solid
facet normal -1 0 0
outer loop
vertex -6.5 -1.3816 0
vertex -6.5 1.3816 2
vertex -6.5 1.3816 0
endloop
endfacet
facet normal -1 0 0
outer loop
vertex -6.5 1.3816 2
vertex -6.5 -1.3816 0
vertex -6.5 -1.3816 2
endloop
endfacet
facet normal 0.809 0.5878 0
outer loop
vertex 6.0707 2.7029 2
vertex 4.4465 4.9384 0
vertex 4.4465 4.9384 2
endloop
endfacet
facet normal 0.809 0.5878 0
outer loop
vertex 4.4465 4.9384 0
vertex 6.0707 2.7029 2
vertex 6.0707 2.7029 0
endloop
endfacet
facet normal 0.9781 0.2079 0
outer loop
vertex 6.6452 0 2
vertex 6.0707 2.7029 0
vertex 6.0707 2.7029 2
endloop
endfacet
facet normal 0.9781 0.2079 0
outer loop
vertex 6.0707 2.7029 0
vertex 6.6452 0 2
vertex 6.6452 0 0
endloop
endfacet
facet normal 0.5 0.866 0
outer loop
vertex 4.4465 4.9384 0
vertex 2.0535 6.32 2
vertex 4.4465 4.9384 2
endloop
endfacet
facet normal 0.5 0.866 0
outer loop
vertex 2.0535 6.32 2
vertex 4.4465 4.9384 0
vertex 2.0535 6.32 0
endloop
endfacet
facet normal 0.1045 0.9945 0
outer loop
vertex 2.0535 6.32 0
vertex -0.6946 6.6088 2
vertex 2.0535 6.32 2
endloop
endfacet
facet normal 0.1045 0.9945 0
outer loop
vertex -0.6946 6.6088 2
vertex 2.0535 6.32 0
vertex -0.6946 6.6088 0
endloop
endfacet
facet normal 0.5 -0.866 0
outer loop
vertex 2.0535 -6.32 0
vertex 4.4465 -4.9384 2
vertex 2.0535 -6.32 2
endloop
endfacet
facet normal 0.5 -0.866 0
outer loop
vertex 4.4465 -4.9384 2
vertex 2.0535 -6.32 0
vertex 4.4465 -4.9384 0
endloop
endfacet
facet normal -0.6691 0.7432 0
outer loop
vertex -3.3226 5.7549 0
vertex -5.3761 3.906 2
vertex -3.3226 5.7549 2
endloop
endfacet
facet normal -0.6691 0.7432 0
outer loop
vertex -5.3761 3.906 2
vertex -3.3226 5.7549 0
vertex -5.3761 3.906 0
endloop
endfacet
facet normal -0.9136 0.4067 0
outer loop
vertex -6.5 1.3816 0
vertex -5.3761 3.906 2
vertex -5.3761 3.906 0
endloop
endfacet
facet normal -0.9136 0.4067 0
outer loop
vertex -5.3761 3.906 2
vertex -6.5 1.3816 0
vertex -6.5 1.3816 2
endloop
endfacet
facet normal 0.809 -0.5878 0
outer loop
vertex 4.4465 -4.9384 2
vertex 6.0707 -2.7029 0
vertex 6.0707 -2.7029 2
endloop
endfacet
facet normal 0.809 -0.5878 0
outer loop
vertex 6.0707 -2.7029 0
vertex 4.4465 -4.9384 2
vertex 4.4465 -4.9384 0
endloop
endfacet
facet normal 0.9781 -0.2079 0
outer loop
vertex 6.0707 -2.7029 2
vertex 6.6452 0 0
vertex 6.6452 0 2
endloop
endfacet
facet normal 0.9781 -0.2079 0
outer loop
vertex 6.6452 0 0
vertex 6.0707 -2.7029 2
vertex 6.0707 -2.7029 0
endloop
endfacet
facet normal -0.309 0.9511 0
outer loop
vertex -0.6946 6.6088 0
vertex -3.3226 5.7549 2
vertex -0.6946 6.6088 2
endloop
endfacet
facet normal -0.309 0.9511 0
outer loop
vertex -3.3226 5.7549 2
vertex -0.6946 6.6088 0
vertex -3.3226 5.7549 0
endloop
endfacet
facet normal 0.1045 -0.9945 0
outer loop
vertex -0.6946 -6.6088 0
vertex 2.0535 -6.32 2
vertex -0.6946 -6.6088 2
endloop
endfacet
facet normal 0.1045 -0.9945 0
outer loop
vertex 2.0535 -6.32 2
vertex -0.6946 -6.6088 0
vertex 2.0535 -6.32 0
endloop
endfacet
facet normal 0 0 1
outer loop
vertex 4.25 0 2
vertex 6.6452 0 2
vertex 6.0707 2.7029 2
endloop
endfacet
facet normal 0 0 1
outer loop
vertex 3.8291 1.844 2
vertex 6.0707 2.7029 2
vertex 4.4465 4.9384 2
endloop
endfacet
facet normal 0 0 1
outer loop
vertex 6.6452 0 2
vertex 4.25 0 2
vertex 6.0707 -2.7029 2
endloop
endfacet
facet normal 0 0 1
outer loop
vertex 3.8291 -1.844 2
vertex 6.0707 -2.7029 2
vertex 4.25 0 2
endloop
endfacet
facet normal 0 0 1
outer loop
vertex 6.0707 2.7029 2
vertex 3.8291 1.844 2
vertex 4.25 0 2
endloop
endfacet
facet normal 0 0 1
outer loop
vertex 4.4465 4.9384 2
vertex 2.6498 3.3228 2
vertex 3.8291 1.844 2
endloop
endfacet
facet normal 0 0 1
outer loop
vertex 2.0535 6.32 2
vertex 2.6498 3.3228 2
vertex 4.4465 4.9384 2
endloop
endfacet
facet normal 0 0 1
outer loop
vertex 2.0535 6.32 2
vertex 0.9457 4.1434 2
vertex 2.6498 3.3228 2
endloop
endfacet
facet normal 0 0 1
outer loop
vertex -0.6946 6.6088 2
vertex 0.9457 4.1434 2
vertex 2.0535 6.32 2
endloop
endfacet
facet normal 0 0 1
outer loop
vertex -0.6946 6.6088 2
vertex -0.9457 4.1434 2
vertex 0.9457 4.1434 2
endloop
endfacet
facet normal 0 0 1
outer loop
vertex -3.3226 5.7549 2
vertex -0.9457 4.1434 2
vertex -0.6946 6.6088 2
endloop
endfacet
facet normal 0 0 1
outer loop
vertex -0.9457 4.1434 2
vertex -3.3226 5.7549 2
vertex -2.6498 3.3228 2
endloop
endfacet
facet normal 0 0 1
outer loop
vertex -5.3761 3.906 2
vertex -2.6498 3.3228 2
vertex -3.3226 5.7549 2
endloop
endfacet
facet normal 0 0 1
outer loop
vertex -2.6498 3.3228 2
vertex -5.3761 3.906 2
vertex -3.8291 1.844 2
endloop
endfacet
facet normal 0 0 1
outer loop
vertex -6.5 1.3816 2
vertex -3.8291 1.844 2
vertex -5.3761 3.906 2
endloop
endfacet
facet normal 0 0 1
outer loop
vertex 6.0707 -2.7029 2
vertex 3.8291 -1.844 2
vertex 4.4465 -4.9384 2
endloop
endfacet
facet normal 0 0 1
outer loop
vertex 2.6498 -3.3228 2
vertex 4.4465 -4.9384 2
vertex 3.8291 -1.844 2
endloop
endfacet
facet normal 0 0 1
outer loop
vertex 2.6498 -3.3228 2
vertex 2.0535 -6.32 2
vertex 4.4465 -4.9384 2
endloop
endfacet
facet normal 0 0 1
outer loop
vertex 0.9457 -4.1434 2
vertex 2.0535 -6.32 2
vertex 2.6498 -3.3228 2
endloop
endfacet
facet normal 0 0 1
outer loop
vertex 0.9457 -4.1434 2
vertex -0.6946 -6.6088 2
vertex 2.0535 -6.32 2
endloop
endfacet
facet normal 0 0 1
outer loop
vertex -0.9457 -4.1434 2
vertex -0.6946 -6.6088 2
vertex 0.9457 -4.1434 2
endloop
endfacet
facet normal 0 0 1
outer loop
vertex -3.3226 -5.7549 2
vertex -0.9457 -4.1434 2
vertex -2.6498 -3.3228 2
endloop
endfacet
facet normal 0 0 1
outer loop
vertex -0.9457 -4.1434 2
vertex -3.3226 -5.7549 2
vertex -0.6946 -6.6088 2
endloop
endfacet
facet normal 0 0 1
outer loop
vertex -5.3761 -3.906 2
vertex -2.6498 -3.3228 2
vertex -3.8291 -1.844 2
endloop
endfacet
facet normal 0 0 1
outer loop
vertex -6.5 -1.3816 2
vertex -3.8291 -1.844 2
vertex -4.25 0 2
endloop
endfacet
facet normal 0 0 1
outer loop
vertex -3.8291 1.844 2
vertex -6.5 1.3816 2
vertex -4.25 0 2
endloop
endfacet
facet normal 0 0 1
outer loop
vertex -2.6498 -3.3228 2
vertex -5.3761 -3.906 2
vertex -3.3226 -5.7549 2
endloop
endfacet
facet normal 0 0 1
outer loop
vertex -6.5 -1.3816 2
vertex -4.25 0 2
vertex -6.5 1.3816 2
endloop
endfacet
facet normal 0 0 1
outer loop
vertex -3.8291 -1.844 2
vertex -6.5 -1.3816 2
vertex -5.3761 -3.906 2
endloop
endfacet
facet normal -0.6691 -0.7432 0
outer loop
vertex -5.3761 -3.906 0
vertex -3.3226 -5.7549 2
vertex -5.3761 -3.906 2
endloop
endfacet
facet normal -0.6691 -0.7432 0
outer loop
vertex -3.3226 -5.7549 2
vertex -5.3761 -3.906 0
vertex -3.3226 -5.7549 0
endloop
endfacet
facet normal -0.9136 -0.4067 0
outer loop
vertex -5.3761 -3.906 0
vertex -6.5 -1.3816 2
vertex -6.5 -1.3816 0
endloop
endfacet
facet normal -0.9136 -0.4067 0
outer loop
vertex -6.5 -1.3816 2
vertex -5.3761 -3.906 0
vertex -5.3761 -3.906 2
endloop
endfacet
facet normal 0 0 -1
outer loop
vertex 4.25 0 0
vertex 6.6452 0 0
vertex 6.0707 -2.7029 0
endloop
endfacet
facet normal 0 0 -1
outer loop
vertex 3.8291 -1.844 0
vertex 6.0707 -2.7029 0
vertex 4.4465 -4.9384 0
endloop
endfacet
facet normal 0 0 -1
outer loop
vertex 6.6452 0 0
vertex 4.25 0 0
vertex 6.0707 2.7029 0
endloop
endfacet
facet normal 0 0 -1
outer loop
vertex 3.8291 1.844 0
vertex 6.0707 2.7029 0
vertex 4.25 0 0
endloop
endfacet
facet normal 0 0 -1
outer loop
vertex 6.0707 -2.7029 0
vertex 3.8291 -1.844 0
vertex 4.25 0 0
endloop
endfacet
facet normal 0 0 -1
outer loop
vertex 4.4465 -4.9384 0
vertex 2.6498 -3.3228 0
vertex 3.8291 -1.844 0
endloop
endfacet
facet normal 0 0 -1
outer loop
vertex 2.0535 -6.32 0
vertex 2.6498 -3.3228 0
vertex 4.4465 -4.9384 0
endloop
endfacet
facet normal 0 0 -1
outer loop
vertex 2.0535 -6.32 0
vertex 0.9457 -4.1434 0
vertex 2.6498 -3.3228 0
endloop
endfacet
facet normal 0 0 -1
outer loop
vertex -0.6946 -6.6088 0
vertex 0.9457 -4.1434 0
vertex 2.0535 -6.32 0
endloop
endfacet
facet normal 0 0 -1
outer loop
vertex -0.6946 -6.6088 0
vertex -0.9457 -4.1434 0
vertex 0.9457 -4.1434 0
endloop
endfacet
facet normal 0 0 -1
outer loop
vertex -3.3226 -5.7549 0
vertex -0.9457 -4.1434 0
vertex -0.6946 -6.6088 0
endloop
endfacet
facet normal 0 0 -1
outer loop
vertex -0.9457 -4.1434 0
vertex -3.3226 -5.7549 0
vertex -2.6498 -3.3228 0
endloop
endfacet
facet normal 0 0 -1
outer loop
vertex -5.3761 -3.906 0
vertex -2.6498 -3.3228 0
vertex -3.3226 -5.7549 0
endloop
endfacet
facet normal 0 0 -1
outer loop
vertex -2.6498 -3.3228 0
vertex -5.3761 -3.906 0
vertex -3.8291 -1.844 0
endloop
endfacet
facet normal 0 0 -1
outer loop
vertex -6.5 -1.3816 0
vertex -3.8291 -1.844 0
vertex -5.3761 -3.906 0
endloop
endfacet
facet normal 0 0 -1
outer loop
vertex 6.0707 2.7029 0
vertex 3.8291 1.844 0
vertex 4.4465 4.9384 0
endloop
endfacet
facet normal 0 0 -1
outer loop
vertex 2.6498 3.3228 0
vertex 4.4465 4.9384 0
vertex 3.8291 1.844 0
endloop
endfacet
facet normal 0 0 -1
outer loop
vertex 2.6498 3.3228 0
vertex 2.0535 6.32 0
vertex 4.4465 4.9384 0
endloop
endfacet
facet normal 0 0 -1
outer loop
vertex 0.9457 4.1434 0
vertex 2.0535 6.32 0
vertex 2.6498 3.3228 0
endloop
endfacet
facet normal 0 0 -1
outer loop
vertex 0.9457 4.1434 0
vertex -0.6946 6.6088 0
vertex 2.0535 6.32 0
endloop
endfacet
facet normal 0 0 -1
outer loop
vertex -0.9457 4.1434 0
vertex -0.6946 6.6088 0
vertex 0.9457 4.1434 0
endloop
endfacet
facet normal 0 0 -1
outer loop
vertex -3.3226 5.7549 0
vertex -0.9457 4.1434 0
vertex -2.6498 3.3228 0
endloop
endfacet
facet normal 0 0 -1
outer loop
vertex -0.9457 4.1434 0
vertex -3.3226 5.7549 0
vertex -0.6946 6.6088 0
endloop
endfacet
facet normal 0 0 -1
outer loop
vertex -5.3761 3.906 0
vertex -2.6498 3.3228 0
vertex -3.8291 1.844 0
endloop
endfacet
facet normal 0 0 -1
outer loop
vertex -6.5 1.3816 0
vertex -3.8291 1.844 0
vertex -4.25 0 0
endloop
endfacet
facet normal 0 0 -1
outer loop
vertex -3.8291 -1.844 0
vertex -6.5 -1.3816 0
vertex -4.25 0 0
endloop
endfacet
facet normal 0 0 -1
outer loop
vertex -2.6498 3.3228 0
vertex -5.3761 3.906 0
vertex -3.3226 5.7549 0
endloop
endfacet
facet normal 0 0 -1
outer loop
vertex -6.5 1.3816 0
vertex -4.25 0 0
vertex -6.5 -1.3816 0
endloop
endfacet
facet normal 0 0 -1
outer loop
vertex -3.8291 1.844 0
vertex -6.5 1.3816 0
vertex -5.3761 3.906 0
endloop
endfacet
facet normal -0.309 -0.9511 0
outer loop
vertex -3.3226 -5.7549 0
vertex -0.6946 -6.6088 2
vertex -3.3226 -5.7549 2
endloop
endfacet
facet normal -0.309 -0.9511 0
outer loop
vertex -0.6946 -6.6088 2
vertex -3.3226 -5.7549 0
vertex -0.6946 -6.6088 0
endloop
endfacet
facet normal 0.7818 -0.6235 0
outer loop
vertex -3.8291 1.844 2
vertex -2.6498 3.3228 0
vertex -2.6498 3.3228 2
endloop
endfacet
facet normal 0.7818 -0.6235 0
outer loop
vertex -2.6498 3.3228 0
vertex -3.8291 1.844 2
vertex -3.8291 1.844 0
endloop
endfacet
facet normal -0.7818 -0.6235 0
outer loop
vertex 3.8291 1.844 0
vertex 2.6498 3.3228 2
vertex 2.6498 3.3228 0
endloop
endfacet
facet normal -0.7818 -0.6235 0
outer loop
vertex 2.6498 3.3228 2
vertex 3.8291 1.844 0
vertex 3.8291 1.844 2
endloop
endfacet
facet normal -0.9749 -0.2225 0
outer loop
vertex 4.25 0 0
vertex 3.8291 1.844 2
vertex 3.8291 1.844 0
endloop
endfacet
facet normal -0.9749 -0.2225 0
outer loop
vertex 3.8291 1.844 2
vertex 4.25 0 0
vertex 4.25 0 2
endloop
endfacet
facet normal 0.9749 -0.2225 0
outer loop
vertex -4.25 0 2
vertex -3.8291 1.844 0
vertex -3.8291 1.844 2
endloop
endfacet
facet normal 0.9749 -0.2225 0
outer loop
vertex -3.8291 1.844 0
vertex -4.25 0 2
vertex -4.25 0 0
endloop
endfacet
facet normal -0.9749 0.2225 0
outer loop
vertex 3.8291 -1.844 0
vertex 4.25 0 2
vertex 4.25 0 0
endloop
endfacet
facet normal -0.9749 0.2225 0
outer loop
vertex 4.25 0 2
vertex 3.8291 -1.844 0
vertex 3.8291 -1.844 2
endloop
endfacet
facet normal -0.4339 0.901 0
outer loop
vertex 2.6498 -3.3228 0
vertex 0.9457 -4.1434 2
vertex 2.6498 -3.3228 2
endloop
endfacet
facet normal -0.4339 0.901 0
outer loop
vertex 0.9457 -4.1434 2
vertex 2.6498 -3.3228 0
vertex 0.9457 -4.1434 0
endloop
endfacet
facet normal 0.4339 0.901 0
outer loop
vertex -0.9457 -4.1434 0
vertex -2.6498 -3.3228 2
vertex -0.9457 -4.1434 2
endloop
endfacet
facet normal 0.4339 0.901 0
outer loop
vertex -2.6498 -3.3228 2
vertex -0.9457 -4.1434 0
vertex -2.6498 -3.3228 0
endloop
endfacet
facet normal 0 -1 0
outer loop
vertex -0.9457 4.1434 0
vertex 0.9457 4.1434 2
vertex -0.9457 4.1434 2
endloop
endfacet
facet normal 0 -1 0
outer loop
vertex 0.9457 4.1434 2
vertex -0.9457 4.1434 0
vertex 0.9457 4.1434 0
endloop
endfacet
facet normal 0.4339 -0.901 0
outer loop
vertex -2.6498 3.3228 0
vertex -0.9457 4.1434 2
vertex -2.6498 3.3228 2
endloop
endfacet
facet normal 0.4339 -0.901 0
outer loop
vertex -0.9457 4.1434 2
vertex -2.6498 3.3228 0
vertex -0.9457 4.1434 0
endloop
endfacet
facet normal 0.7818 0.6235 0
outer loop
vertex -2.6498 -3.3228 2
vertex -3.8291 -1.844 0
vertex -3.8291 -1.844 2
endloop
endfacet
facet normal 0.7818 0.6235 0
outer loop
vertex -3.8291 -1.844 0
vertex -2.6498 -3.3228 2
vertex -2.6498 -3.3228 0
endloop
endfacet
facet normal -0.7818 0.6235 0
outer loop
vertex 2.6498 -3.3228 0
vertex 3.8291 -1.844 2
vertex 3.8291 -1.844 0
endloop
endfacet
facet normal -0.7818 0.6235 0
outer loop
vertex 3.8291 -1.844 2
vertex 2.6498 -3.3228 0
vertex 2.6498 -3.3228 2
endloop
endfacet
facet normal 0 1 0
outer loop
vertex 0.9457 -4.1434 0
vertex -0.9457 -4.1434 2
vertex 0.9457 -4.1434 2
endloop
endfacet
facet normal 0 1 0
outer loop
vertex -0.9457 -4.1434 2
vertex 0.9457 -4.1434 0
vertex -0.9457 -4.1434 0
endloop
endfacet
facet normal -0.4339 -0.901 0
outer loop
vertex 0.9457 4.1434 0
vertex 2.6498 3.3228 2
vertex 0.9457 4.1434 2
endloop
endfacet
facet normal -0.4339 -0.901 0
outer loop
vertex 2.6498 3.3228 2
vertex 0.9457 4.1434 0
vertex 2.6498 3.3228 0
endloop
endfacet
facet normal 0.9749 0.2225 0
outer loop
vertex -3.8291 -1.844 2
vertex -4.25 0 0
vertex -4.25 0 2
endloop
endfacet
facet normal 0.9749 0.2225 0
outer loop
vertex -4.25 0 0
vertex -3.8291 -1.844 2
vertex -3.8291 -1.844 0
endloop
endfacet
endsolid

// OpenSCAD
module cylinder_outer(h,d=undef,d1=undef,d2=undef,fn=15) {
	fudge = cos(180/fn);
	cylinder(h=h,d=d/fudge,d1=d1/fudge,d2=d2/fudge,$fn=fn);
}

module hole(d, h, countersink=0, extra_above=false, center=true) {
    translate([0, 0, center?h/2:0]) { 
        h = h - countersink;
        translate([0, 0, -(h+countersink)]) {
            translate([0, 0, h+0.001]) cylinder_outer(d1=d, d2=d*1.5, h=countersink);
            if (extra_above) {
                translate([0, 0, height+0.001]) cylinder_outer(d1=d, d2=d*2, h=countersink*3/2);
            }
            if (h > 0)
                translate([0, 0, -0.1]) cylinder_outer(d=d, h=h+0.2);
        }
    }
}

module nut_trap(w, h, sides, center=false){
	cylinder(r = w / 2 / cos(180 / 6) + 0.05, h=h, $fn=6, center=center);
}

module rim(id, od, h) {
	difference() {
		cylinder_outer(h=h, d=od);
		translate([0, 0, -1]) cylinder(h=h+2, d=id);
	}
}

rim(8.5, 13, 2);
